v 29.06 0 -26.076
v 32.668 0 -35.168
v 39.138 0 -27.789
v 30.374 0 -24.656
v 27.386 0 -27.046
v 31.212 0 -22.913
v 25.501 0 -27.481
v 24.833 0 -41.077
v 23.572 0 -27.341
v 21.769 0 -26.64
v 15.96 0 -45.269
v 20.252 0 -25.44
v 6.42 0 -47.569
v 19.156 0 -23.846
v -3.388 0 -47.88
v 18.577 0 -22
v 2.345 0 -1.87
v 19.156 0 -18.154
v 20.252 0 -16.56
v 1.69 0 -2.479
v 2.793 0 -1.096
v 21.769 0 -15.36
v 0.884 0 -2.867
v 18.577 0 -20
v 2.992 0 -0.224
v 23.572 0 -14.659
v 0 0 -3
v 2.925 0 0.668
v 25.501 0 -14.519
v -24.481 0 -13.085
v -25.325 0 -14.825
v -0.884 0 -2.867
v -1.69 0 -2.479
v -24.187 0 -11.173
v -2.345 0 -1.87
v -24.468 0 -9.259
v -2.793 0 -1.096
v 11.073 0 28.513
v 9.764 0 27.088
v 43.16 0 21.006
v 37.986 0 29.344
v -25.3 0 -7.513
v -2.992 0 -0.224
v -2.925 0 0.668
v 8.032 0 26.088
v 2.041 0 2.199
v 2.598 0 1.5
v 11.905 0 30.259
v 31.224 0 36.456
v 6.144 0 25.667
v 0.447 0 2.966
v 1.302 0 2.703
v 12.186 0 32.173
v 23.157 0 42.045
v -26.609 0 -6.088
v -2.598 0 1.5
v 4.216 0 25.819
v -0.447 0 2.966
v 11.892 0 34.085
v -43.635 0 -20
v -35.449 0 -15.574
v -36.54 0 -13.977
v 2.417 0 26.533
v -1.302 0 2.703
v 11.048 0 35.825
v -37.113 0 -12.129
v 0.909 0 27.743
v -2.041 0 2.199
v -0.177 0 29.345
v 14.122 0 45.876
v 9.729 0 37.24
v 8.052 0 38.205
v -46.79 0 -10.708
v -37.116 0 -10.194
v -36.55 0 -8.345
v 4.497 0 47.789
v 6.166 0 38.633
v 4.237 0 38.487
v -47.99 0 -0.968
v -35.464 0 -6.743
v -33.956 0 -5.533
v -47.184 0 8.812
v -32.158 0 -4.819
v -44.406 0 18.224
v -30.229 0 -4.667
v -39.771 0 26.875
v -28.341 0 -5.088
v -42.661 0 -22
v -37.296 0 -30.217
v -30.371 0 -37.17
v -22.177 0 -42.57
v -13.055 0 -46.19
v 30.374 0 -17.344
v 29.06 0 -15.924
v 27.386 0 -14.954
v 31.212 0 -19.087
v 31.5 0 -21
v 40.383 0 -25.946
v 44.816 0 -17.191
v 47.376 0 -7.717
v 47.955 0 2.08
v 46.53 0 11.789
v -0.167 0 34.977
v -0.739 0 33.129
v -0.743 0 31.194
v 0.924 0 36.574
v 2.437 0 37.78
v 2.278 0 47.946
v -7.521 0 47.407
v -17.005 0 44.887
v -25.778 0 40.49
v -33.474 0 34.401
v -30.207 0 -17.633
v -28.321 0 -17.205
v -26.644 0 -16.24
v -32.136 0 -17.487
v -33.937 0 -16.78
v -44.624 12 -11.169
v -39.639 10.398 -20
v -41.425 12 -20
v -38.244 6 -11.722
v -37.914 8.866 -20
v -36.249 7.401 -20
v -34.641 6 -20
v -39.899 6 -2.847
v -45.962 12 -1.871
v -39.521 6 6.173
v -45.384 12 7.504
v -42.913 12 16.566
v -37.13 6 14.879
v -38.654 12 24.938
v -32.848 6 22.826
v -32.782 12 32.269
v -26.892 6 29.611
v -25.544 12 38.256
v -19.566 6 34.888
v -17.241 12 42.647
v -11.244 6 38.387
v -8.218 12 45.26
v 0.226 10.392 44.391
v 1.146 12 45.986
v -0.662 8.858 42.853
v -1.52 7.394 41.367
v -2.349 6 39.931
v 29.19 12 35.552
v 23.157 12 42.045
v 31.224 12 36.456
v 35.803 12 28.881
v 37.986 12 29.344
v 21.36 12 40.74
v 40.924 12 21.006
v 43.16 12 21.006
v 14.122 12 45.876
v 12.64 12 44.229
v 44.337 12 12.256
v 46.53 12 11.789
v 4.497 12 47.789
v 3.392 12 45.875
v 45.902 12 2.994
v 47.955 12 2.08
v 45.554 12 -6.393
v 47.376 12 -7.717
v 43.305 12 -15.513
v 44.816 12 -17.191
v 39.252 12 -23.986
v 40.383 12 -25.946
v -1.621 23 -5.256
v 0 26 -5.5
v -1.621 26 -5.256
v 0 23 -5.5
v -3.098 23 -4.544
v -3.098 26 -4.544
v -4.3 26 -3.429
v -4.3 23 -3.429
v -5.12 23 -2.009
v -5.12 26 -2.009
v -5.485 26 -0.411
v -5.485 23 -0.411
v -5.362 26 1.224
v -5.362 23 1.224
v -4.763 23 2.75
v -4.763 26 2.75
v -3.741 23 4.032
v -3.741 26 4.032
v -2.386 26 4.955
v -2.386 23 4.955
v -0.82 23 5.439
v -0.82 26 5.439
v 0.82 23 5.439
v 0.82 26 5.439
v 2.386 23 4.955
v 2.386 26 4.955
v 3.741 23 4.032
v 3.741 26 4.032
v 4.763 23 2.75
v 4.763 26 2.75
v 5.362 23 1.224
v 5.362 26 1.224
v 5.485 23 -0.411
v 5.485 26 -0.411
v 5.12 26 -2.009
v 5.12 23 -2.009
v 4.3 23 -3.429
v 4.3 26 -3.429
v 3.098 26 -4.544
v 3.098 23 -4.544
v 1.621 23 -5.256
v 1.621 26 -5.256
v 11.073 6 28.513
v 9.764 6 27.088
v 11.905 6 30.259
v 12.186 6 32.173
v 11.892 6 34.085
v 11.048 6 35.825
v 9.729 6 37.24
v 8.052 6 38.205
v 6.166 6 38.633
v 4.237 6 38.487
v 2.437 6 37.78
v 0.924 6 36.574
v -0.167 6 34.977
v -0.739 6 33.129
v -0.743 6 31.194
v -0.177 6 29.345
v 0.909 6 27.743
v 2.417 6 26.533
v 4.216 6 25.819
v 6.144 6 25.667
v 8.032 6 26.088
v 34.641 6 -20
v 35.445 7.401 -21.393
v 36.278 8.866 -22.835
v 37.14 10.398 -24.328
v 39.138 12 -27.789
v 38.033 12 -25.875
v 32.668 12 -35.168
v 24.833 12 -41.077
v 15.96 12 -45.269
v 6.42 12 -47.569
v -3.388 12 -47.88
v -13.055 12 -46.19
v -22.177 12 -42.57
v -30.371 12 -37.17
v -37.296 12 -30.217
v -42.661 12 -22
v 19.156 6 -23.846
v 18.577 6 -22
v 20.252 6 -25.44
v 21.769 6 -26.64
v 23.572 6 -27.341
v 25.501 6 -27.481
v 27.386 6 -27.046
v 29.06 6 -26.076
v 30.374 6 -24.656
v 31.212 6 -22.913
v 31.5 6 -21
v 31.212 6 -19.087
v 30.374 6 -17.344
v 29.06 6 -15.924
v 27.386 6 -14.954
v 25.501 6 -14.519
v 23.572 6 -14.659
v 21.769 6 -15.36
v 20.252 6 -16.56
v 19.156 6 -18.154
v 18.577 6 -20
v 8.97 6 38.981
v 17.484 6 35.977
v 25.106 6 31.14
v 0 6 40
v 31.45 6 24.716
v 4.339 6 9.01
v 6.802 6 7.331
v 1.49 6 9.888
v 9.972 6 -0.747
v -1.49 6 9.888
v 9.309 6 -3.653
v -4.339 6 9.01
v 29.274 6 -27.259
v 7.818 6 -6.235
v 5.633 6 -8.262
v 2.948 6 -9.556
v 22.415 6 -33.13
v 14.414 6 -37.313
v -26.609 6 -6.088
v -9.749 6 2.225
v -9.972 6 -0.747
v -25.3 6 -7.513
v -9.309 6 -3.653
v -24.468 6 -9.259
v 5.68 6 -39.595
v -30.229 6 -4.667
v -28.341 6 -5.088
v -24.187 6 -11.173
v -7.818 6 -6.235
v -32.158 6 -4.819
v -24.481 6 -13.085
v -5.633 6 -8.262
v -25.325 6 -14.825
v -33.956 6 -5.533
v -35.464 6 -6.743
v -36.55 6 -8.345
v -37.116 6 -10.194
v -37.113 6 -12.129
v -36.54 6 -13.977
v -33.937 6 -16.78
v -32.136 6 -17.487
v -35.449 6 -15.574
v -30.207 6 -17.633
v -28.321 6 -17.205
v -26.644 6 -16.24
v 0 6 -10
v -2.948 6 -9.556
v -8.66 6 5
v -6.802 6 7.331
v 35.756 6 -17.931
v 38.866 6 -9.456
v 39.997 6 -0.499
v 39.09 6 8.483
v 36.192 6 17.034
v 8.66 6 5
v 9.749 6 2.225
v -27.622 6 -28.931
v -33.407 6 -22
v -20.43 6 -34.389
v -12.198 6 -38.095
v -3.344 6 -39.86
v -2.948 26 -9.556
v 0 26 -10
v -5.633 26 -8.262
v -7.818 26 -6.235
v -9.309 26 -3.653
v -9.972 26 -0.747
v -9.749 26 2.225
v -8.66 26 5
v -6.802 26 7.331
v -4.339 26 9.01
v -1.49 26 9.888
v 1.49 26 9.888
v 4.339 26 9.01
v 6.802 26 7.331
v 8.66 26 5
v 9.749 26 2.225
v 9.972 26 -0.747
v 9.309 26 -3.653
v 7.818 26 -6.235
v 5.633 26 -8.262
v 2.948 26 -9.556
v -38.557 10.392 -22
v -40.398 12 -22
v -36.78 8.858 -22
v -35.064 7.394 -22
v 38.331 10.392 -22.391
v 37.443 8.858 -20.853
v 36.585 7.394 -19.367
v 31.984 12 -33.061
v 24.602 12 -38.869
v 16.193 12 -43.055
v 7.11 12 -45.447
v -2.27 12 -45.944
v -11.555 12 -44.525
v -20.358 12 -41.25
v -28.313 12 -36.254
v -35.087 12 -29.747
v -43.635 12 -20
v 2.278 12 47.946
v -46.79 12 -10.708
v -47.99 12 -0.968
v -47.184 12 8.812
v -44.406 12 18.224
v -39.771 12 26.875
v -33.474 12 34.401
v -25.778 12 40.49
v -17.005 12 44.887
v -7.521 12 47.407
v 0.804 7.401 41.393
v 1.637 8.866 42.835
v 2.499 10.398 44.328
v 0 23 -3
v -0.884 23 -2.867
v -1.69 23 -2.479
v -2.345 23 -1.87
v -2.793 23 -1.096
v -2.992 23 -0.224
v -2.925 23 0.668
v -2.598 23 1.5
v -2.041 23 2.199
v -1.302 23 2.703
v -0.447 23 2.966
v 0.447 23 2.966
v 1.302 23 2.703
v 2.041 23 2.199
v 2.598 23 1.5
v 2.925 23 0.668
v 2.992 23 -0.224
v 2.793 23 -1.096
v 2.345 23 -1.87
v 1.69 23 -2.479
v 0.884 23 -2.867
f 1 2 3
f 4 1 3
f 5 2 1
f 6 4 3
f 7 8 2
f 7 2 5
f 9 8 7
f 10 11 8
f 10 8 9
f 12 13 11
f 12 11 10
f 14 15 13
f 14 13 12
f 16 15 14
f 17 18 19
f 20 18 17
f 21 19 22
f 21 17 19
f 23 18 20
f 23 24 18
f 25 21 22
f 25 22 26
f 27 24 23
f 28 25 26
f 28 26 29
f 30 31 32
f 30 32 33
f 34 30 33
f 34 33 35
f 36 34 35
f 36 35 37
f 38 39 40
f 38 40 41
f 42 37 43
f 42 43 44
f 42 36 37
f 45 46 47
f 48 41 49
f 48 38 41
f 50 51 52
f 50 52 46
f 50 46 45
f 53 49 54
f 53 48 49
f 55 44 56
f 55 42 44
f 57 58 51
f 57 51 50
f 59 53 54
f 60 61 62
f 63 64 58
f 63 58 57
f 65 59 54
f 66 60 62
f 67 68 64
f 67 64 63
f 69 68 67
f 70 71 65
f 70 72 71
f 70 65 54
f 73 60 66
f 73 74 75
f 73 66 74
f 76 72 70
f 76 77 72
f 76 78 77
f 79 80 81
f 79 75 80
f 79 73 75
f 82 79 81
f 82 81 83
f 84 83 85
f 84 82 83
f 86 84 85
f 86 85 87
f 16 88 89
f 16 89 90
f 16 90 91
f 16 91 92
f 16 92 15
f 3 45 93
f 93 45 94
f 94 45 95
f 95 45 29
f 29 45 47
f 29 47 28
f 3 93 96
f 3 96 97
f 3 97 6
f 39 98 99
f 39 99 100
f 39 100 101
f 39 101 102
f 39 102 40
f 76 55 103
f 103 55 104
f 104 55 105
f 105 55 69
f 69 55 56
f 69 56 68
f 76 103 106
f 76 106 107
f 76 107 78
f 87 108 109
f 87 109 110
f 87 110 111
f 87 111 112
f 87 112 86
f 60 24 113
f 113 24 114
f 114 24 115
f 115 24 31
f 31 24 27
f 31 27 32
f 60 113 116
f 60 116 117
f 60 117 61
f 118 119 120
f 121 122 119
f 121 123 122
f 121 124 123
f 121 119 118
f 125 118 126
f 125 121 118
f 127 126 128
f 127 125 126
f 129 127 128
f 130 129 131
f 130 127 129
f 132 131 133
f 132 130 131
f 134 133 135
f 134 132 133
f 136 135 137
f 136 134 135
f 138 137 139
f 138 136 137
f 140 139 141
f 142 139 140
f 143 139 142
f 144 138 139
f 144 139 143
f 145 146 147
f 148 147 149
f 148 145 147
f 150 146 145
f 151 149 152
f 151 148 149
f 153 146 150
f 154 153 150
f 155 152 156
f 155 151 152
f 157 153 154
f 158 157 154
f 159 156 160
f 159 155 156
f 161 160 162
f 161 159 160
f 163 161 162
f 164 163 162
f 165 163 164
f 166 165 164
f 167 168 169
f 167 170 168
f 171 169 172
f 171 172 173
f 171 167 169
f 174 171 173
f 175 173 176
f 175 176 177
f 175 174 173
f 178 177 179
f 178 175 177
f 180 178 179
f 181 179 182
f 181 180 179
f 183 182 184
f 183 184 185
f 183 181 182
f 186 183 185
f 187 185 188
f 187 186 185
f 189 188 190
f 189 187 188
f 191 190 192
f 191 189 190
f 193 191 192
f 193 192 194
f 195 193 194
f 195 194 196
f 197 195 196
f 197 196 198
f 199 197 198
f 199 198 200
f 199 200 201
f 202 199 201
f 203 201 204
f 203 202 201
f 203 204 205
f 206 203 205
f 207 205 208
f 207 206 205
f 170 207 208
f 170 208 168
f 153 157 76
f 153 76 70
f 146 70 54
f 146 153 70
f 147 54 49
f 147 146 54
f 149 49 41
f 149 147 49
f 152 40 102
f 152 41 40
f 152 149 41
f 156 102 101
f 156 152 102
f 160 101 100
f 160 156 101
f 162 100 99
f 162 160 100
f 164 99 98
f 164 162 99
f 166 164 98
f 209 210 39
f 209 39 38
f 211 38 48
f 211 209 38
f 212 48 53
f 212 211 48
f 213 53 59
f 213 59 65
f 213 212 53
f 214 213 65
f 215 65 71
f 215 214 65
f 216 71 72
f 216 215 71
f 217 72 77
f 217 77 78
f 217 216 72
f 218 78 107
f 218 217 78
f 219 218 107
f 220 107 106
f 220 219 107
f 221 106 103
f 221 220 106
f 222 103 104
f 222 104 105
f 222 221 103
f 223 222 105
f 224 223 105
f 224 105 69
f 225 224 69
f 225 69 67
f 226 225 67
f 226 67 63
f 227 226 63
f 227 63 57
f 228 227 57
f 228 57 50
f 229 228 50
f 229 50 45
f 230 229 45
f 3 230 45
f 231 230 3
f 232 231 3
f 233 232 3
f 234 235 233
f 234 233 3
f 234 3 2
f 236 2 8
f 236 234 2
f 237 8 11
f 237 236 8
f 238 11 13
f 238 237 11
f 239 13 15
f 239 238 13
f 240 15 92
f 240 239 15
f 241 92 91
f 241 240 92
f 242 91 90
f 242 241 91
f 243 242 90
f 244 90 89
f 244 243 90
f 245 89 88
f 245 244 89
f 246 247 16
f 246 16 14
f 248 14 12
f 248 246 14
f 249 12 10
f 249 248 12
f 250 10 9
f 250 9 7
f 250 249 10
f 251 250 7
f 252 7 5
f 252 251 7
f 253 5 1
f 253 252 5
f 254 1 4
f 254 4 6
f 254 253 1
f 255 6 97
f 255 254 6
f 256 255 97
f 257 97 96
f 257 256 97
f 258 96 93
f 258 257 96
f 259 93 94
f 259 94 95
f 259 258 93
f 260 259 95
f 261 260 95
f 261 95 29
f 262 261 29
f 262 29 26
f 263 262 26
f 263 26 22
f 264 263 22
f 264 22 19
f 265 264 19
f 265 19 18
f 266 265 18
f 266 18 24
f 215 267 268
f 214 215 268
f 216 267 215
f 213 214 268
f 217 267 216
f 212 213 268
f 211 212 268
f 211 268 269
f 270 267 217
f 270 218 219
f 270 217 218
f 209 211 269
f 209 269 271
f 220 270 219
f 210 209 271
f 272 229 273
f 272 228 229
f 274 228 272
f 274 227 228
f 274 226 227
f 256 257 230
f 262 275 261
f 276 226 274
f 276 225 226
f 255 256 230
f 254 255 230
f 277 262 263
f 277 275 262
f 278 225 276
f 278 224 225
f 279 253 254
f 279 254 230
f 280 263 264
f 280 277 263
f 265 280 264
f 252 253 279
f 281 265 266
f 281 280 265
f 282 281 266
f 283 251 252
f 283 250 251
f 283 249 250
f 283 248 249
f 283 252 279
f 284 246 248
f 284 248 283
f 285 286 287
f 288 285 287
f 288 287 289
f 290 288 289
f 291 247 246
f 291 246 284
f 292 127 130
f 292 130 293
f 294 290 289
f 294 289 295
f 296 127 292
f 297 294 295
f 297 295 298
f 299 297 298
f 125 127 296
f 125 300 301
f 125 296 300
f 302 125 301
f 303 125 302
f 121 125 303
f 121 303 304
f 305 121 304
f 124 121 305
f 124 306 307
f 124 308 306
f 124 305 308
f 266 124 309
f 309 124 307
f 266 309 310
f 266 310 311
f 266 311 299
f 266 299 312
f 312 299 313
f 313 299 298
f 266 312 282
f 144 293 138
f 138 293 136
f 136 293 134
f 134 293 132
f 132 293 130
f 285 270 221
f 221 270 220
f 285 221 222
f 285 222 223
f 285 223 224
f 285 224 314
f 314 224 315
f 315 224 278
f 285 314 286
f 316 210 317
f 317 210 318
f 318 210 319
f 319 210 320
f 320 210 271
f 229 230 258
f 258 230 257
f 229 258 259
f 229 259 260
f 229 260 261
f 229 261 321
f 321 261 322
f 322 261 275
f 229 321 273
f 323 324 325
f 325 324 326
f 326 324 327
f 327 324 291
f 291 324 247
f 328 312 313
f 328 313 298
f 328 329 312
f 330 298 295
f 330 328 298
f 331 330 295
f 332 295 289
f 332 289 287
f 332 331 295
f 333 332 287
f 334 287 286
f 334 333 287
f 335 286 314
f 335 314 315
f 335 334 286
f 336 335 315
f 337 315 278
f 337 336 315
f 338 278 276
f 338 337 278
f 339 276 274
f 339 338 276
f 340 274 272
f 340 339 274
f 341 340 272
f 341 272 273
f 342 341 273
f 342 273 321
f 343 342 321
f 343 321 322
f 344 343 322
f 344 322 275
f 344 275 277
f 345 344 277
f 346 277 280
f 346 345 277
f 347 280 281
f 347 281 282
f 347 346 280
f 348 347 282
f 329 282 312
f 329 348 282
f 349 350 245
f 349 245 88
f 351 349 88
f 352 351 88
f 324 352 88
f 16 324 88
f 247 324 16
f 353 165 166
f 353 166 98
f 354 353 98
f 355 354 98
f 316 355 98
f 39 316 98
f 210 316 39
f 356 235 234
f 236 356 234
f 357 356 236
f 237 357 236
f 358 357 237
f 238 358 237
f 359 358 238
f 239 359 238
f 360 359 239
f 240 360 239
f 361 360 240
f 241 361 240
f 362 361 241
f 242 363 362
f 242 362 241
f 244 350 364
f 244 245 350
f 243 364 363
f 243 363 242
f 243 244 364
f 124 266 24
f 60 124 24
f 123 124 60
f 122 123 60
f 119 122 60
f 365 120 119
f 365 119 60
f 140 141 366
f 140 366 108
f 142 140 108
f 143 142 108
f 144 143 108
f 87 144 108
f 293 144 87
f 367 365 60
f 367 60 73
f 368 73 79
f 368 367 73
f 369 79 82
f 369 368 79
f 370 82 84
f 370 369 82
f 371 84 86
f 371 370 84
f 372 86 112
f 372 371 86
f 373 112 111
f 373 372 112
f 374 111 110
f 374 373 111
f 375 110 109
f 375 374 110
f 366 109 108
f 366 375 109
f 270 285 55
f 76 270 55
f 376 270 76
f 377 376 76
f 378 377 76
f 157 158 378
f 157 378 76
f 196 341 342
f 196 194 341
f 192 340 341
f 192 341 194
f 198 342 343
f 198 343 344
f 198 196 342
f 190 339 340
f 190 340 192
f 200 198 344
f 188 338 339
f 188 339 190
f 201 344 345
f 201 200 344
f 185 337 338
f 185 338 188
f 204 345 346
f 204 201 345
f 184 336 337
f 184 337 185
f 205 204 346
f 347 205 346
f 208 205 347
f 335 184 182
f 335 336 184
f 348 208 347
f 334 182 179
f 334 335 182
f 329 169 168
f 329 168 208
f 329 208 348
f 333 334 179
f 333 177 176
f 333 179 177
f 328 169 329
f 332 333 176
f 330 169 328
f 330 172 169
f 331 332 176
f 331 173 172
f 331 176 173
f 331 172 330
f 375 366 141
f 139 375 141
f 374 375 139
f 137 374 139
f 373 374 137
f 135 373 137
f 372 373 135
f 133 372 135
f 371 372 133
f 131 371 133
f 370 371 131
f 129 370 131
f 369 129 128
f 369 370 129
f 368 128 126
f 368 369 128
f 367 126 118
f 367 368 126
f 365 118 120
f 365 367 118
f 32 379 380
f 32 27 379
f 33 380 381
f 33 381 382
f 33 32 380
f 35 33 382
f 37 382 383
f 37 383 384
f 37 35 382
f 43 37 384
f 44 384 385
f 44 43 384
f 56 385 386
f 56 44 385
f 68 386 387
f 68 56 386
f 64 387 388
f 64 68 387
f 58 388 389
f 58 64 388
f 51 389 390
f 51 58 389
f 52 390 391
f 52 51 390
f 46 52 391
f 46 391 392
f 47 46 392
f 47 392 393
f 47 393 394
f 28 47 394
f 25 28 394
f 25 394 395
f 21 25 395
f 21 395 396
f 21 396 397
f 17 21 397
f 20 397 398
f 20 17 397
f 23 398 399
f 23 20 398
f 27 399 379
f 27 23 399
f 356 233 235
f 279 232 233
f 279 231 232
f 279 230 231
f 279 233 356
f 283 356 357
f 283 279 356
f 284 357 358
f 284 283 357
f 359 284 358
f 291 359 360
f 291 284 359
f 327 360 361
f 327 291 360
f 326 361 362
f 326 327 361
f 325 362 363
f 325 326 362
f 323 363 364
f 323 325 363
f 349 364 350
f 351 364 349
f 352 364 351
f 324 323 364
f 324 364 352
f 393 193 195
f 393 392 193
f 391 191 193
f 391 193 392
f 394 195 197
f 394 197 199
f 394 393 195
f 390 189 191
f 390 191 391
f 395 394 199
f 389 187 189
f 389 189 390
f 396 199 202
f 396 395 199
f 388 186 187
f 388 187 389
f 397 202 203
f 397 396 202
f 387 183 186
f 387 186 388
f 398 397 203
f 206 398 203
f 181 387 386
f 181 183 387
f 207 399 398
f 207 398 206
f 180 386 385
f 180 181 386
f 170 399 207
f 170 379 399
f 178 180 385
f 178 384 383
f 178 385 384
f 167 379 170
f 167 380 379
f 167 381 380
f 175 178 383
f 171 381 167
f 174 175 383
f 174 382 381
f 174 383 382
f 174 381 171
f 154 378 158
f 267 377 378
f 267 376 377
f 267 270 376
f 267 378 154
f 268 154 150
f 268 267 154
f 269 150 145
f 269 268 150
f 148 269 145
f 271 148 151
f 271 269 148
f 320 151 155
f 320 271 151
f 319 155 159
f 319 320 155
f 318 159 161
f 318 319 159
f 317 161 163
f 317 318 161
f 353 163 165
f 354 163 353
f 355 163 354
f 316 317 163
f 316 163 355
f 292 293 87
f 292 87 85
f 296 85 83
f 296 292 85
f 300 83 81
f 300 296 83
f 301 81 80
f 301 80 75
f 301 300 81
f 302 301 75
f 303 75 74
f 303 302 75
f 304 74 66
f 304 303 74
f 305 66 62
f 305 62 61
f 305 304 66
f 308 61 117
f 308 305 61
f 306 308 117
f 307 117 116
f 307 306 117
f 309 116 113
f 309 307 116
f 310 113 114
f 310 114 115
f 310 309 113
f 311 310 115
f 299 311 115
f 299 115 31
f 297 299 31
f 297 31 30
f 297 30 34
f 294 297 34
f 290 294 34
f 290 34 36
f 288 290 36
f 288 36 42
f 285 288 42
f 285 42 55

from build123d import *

# Parameters (mm, degrees)
CUT_EXTRUDE_START        = -15
CUT_EXTRUDE_1_DEPTH      = 15
PATTERN_CIRCULAR_1_COUNT = 3


with BuildPart() as part:
    # 草图2 → 旋转1 (revolve)
    with BuildSketch(Plane.XY):
        Polygon((3, 0), (48, 0), (48, 12), (46, 12), (40, 6), (10, 6), (10, 26), (5.5, 26), (5.5, 23), (3, 23), align=None)
    revolve(axis=Axis((0, -31.681818182, 0), (0, 1, 0)))

    # 草图4 → 切除-拉伸1 (cut)
    with BuildSketch(Plane(origin=(0, 0, 0), x_dir=(-1, 0, 0), z_dir=(0, -1, 0)).offset(CUT_EXTRUDE_START)):
        with BuildLine():
            Line((-18.577383711, 20), (43.634848459, 20))
            ThreePointArc((43.634848459, 20), (43.159739663, 21.005639058), (42.661458015, 22))
            Line((42.661458015, 22), (-18.577383711, 22))
            ThreePointArc((-18.577383711, 22), (-31.5, 21), (-18.577383711, 20))
        make_face()
    cut_extrude_1 = extrude(amount=CUT_EXTRUDE_1_DEPTH, mode=Mode.SUBTRACT)

    # 阵列(圆周)1: 切除-拉伸1 ×3 about axis
    pattern_circular_1_axis = Axis((0, 27.3, 0), (0, -1, 0))
    for i in range(1, PATTERN_CIRCULAR_1_COUNT):
        add(cut_extrude_1.rotate(pattern_circular_1_axis, i * 360 / PATTERN_CIRCULAR_1_COUNT), mode=Mode.SUBTRACT)


solid = part.part
